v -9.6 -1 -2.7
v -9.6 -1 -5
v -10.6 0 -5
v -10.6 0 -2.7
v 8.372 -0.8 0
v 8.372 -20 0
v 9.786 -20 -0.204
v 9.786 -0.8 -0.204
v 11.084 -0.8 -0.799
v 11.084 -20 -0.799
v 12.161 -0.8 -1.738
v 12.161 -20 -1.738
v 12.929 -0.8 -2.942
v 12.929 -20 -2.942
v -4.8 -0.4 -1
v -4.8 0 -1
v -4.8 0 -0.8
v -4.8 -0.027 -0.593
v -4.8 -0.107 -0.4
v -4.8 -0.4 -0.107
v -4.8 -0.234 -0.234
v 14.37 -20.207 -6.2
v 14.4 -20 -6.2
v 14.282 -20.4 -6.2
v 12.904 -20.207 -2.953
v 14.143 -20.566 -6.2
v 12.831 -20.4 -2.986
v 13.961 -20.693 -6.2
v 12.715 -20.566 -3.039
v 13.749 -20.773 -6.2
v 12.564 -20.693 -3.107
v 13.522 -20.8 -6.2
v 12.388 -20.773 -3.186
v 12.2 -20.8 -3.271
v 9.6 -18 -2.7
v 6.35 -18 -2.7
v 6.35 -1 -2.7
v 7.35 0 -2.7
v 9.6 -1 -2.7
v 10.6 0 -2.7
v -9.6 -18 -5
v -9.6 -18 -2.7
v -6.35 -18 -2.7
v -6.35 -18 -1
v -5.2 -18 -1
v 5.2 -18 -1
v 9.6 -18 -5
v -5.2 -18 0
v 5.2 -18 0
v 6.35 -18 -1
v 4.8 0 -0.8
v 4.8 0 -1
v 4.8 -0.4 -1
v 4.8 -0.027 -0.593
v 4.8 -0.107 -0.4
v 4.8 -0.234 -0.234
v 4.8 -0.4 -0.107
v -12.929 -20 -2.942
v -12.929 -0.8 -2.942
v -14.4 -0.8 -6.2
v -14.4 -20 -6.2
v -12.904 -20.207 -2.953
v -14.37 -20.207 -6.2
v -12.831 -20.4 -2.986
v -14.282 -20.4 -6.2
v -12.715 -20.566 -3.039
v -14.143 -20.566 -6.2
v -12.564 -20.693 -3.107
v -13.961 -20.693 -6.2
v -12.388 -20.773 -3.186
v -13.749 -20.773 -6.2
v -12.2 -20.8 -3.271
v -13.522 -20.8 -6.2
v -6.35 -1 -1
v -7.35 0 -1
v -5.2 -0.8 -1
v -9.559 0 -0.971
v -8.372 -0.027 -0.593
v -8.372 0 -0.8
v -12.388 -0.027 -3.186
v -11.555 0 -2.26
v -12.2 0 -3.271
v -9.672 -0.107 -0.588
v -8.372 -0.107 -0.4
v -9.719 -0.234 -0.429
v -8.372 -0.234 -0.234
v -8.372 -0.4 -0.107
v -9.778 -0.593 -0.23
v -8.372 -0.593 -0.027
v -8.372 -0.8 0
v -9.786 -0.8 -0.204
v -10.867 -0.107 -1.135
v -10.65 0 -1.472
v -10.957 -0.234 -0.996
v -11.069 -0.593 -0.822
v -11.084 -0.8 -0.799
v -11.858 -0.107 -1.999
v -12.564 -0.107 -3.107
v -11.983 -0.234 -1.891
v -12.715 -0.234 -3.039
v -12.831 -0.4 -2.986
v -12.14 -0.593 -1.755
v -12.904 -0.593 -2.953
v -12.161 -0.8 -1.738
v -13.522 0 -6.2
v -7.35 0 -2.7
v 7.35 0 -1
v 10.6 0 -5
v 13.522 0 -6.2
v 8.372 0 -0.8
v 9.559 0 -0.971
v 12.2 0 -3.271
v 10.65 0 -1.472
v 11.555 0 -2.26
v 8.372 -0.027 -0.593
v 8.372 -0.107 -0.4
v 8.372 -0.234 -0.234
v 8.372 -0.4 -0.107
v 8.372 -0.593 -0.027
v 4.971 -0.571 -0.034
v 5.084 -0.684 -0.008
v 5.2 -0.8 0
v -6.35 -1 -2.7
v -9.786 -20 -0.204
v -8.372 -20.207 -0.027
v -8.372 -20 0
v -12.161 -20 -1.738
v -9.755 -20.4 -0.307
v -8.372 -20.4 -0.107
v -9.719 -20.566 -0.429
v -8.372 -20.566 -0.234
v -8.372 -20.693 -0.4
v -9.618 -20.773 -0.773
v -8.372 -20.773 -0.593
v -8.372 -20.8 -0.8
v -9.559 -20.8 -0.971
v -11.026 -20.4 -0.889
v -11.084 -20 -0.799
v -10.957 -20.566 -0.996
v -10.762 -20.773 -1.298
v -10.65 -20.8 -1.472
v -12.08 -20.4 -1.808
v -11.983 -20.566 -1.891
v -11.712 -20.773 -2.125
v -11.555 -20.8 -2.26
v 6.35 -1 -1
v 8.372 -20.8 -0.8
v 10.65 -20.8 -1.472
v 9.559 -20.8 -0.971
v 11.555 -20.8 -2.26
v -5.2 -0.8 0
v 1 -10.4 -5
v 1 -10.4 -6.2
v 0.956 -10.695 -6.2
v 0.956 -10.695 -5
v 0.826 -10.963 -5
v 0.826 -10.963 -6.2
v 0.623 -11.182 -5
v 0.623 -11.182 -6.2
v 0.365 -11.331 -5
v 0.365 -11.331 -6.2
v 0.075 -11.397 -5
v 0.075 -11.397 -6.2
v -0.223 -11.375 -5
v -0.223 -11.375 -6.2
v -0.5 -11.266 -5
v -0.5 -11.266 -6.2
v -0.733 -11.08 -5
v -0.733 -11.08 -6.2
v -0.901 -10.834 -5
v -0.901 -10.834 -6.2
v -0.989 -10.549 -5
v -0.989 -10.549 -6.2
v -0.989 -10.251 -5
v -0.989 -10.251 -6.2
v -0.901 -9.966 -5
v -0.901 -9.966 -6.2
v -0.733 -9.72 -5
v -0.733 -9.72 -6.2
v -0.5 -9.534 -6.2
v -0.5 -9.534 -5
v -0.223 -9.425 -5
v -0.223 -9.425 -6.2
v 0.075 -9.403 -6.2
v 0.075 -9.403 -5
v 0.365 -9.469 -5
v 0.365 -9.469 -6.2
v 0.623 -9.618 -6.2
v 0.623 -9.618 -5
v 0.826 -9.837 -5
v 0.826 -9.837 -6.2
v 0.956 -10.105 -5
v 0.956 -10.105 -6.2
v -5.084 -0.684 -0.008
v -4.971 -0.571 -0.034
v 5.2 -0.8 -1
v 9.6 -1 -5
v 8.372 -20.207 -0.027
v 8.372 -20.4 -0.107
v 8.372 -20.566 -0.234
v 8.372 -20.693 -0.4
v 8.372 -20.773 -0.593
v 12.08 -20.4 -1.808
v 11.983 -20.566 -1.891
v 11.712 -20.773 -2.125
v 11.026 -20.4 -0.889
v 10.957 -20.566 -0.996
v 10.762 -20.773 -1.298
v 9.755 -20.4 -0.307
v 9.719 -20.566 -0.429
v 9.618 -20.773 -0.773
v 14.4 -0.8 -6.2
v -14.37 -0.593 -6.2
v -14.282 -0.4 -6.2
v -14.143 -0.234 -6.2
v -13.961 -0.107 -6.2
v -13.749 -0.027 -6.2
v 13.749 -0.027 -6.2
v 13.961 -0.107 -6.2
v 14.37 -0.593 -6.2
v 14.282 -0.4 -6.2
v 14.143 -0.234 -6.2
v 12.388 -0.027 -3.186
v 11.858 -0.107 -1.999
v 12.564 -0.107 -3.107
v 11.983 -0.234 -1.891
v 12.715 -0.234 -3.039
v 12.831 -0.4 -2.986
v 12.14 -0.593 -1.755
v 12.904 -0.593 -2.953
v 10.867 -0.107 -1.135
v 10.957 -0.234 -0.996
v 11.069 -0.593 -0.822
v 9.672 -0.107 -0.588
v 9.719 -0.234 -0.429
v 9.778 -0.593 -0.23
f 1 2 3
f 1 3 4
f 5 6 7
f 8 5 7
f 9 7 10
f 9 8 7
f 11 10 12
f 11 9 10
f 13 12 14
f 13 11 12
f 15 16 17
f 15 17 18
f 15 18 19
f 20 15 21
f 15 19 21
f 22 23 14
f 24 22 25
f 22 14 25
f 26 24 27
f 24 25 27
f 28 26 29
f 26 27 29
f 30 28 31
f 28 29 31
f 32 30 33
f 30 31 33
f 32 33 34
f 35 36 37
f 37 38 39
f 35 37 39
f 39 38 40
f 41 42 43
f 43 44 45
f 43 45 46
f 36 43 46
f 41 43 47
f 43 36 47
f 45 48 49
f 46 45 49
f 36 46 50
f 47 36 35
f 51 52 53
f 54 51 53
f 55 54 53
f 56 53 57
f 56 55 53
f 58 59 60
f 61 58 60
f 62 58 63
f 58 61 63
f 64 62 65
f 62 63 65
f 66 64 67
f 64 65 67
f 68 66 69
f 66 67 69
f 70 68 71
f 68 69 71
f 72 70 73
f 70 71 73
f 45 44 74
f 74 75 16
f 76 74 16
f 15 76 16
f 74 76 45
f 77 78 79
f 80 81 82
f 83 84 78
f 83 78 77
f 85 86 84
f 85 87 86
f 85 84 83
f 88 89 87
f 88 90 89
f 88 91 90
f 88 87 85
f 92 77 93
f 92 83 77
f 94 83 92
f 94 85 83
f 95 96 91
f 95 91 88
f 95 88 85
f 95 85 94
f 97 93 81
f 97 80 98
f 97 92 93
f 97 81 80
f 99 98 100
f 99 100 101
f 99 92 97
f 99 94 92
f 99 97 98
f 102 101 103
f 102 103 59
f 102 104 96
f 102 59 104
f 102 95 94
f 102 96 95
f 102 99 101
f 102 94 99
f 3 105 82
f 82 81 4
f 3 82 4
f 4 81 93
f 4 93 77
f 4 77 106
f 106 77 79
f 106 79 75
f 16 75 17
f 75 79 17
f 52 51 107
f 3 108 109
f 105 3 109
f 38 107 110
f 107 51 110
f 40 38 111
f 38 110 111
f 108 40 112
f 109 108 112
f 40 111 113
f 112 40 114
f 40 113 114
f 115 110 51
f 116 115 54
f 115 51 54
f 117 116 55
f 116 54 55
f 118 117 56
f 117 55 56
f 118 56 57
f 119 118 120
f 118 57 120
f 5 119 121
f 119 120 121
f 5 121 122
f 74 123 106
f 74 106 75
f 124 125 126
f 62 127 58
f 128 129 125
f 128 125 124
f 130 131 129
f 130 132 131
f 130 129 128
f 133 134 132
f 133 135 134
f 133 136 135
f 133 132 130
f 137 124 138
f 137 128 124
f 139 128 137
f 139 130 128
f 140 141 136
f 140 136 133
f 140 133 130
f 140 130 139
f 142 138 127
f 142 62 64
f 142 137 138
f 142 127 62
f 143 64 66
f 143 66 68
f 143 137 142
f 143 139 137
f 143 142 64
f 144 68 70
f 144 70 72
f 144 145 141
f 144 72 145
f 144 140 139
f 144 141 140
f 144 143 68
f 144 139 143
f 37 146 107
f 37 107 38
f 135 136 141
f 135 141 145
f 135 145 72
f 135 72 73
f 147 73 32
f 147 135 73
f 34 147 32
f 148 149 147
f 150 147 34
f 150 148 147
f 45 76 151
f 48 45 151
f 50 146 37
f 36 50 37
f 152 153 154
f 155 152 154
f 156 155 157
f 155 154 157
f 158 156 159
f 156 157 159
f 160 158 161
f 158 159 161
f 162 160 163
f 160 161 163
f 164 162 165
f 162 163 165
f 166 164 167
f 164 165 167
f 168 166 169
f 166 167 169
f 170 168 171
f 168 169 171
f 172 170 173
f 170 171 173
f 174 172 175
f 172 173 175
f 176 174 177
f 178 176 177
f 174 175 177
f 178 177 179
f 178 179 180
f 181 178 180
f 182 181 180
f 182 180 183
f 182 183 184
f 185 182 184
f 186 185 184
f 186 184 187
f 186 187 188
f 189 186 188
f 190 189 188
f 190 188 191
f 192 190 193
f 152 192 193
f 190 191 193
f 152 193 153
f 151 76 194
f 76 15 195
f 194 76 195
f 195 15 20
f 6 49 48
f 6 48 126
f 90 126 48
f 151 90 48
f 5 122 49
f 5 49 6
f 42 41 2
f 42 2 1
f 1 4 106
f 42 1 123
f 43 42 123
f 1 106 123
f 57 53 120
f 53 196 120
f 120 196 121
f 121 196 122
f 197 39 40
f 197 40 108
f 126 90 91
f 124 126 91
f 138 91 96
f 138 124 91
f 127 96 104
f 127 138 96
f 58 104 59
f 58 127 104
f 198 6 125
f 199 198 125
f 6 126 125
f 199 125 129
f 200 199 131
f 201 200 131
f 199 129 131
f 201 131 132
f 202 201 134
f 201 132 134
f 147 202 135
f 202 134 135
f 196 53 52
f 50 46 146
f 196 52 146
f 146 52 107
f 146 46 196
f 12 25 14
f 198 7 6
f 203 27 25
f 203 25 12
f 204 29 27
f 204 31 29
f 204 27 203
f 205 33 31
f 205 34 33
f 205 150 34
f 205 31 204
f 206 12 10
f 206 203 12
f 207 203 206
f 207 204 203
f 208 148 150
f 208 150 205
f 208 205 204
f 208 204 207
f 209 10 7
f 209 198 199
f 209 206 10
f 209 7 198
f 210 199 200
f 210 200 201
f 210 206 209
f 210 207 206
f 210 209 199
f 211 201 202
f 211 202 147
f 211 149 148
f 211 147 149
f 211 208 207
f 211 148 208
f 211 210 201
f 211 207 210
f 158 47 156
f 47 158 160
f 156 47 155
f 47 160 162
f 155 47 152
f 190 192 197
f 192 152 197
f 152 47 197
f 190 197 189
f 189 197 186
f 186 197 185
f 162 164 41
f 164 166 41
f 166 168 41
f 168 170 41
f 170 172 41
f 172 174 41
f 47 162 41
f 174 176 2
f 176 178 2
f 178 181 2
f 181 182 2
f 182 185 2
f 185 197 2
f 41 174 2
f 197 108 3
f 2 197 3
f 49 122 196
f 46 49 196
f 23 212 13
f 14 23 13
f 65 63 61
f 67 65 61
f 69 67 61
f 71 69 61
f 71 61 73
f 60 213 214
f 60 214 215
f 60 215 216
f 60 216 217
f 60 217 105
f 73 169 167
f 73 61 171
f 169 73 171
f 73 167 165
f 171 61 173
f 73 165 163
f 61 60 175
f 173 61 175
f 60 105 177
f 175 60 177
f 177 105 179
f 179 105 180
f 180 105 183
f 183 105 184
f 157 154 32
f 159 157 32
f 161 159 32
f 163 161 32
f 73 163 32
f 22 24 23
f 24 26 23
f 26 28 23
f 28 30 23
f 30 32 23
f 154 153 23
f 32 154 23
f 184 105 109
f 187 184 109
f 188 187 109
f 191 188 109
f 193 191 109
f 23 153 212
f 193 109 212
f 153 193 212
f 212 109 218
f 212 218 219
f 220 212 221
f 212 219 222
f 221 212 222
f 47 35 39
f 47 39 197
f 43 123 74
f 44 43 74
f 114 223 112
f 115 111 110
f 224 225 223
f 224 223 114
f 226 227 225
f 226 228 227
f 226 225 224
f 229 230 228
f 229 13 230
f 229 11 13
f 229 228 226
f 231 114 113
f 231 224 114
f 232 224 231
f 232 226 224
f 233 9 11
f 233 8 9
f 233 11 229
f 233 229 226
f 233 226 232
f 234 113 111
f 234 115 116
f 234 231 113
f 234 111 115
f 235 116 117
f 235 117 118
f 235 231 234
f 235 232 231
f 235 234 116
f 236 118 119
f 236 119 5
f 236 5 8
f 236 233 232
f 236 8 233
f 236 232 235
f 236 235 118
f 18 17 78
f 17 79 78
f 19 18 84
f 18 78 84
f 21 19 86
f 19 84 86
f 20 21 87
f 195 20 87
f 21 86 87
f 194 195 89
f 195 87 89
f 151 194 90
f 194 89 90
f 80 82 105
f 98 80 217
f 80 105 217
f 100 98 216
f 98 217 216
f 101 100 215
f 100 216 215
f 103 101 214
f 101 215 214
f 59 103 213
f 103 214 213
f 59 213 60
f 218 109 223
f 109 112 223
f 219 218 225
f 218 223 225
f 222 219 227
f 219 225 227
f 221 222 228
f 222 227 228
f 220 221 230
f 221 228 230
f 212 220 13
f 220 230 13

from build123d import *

# Parameters (mm, degrees)
F1_DEPTH  = 20
F3_DEPTH  = 2
F0_W      = 0.4
F0_H      = 1
F4_DEPTH  = 0.8
F5_SIZE   = 0.39999
F6_R      = 5
F7_R      = 0.79999
F8_SIZE   = 1
F9_R      = 1
F10_DEPTH = 1.2


# Not quite as in the source:
# - a fillet or chamfer is up to 0.001 mm smaller than in the source, because OpenCascade refuses the exact size


with BuildPart() as f1:
    # F0 (on Front) → F1 (new body)
    with BuildSketch(Plane.XZ):
        Polygon((9.6, -5), (0, -5), (-9.6, -5), (-9.6, -2.7), (-6.35, -2.7), (-6.35, -1), (-5.2, -1), (-5.2, 0), (-11.6, 0), (-14.4, -6.2), (0, -6.2), (14.4, -6.2), (11.6, 0), (5.2, 0), (5.2, -1), (6.35, -1), (6.35, -2.7), (9.6, -2.7), align=None)
    extrude(amount=F1_DEPTH)

    # F2 (on face) → F3 (join)
    with BuildSketch(Plane.XZ.offset(20)):
        Polygon((-5.2, 0), (-11.6, 0), (-14.4, -6.2), (11.6, -6.2), (11.6, 0), (5.2, 0), (5.2, -1), (6.35, -1), (6.35, -2.7), (9.6, -2.7), (9.6, -5), (-9.6, -5), (-9.6, -2.7), (-6.35, -2.7), (-6.35, -1), (-5.2, -1), align=None)
        Polygon((5.2, 0), (-5.2, 0), (-5.2, -1), (-6.35, -1), (-6.35, -2.7), (-9.6, -2.7), (-9.6, -5), (9.6, -5), (9.6, -2.7), (6.35, -2.7), (6.35, -1), (5.2, -1), align=None)
    extrude(amount=-F3_DEPTH)

    # F0 (on Front) + F3_face (on face) + F3_face1 (on face) → F4 (join)
    with BuildSketch(Plane.XZ):
        with Locations((5, -0.5)):
            Rectangle(F0_W, F0_H)
        with Locations((-5, -0.5)):
            Rectangle(F0_W, F0_H)
    with BuildSketch(Plane(origin=(0, -18, -2.8254432042), x_dir=(1, 0, 0), z_dir=(0, 1, 0))):
        Polygon((-5.2, -2.8254432042), (5.2, -2.8254432042), (5.2, -1.8254432042), (6.35, -1.8254432042), (6.35, -0.1254432042), (9.6, -0.1254432042), (9.6, 2.1745567958), (-9.6, 2.1745567958), (-9.6, -0.1254432042), (-6.35, -0.1254432042), (-6.35, -1.8254432042), (-5.2, -1.8254432042), align=None)
    with BuildSketch(Plane(origin=(0, -20, -3.2112820513), x_dir=(1, 0, 0), z_dir=(0, -1, 0))):
        Polygon((14.4, -2.9887179487), (11.6, 3.2112820513), (-11.6, 3.2112820513), (-14.4, -2.9887179487), align=None)
    extrude(amount=F4_DEPTH, dir=(0, -1, 0))

    # F5 (size 0.4 in the source; OpenCascade refuses exactly that, so slightly less here)
    f5_edges = [f1.edges().sort_by_distance(p)[0] for p in [
        (-4.8, -0.8, -0.5),
        (4.8, -0.8, -0.5),
    ]]
    chamfer(f5_edges, length=F5_SIZE)

    # F6
    f6_edges = [f1.edges().sort_by_distance(p)[0] for p in [
        (11.6, -10.4, 0),
        (-11.6, -10.4, 0),
    ]]
    fillet(f6_edges, radius=F6_R)

    # F7 (radius 0.8 in the source; OpenCascade refuses exactly that, so slightly less here)
    f7_edges = [f1.edges().sort_by_distance(p)[0] for p in [
        (13.664338, -20.8, -4.571033),
        (13.664338, 0, -4.571033),
        (-11.083863, 0, -0.799425),
    ]]
    fillet(f7_edges, radius=F7_R)

    # F8
    f8_edges = [f1.edges().sort_by_distance(p)[0] for p in [
        (-9.6, 0, -3.85),
        (-6.35, 0, -1.85),
        (6.35, 0, -1.85),
        (9.6, 0, -3.85),
    ]]
    chamfer(f8_edges, length=F8_SIZE)

    # F9 (on face) → F10 (cut, through all)
    with BuildSketch(Plane(origin=(0, 0, -6.2), x_dir=(1, 0, 0), z_dir=(0, 0, -1))):
        with Locations((0, 10.4)):
            Circle(F9_R)
    extrude(amount=-F10_DEPTH, mode=Mode.SUBTRACT)


solid = f1.part
